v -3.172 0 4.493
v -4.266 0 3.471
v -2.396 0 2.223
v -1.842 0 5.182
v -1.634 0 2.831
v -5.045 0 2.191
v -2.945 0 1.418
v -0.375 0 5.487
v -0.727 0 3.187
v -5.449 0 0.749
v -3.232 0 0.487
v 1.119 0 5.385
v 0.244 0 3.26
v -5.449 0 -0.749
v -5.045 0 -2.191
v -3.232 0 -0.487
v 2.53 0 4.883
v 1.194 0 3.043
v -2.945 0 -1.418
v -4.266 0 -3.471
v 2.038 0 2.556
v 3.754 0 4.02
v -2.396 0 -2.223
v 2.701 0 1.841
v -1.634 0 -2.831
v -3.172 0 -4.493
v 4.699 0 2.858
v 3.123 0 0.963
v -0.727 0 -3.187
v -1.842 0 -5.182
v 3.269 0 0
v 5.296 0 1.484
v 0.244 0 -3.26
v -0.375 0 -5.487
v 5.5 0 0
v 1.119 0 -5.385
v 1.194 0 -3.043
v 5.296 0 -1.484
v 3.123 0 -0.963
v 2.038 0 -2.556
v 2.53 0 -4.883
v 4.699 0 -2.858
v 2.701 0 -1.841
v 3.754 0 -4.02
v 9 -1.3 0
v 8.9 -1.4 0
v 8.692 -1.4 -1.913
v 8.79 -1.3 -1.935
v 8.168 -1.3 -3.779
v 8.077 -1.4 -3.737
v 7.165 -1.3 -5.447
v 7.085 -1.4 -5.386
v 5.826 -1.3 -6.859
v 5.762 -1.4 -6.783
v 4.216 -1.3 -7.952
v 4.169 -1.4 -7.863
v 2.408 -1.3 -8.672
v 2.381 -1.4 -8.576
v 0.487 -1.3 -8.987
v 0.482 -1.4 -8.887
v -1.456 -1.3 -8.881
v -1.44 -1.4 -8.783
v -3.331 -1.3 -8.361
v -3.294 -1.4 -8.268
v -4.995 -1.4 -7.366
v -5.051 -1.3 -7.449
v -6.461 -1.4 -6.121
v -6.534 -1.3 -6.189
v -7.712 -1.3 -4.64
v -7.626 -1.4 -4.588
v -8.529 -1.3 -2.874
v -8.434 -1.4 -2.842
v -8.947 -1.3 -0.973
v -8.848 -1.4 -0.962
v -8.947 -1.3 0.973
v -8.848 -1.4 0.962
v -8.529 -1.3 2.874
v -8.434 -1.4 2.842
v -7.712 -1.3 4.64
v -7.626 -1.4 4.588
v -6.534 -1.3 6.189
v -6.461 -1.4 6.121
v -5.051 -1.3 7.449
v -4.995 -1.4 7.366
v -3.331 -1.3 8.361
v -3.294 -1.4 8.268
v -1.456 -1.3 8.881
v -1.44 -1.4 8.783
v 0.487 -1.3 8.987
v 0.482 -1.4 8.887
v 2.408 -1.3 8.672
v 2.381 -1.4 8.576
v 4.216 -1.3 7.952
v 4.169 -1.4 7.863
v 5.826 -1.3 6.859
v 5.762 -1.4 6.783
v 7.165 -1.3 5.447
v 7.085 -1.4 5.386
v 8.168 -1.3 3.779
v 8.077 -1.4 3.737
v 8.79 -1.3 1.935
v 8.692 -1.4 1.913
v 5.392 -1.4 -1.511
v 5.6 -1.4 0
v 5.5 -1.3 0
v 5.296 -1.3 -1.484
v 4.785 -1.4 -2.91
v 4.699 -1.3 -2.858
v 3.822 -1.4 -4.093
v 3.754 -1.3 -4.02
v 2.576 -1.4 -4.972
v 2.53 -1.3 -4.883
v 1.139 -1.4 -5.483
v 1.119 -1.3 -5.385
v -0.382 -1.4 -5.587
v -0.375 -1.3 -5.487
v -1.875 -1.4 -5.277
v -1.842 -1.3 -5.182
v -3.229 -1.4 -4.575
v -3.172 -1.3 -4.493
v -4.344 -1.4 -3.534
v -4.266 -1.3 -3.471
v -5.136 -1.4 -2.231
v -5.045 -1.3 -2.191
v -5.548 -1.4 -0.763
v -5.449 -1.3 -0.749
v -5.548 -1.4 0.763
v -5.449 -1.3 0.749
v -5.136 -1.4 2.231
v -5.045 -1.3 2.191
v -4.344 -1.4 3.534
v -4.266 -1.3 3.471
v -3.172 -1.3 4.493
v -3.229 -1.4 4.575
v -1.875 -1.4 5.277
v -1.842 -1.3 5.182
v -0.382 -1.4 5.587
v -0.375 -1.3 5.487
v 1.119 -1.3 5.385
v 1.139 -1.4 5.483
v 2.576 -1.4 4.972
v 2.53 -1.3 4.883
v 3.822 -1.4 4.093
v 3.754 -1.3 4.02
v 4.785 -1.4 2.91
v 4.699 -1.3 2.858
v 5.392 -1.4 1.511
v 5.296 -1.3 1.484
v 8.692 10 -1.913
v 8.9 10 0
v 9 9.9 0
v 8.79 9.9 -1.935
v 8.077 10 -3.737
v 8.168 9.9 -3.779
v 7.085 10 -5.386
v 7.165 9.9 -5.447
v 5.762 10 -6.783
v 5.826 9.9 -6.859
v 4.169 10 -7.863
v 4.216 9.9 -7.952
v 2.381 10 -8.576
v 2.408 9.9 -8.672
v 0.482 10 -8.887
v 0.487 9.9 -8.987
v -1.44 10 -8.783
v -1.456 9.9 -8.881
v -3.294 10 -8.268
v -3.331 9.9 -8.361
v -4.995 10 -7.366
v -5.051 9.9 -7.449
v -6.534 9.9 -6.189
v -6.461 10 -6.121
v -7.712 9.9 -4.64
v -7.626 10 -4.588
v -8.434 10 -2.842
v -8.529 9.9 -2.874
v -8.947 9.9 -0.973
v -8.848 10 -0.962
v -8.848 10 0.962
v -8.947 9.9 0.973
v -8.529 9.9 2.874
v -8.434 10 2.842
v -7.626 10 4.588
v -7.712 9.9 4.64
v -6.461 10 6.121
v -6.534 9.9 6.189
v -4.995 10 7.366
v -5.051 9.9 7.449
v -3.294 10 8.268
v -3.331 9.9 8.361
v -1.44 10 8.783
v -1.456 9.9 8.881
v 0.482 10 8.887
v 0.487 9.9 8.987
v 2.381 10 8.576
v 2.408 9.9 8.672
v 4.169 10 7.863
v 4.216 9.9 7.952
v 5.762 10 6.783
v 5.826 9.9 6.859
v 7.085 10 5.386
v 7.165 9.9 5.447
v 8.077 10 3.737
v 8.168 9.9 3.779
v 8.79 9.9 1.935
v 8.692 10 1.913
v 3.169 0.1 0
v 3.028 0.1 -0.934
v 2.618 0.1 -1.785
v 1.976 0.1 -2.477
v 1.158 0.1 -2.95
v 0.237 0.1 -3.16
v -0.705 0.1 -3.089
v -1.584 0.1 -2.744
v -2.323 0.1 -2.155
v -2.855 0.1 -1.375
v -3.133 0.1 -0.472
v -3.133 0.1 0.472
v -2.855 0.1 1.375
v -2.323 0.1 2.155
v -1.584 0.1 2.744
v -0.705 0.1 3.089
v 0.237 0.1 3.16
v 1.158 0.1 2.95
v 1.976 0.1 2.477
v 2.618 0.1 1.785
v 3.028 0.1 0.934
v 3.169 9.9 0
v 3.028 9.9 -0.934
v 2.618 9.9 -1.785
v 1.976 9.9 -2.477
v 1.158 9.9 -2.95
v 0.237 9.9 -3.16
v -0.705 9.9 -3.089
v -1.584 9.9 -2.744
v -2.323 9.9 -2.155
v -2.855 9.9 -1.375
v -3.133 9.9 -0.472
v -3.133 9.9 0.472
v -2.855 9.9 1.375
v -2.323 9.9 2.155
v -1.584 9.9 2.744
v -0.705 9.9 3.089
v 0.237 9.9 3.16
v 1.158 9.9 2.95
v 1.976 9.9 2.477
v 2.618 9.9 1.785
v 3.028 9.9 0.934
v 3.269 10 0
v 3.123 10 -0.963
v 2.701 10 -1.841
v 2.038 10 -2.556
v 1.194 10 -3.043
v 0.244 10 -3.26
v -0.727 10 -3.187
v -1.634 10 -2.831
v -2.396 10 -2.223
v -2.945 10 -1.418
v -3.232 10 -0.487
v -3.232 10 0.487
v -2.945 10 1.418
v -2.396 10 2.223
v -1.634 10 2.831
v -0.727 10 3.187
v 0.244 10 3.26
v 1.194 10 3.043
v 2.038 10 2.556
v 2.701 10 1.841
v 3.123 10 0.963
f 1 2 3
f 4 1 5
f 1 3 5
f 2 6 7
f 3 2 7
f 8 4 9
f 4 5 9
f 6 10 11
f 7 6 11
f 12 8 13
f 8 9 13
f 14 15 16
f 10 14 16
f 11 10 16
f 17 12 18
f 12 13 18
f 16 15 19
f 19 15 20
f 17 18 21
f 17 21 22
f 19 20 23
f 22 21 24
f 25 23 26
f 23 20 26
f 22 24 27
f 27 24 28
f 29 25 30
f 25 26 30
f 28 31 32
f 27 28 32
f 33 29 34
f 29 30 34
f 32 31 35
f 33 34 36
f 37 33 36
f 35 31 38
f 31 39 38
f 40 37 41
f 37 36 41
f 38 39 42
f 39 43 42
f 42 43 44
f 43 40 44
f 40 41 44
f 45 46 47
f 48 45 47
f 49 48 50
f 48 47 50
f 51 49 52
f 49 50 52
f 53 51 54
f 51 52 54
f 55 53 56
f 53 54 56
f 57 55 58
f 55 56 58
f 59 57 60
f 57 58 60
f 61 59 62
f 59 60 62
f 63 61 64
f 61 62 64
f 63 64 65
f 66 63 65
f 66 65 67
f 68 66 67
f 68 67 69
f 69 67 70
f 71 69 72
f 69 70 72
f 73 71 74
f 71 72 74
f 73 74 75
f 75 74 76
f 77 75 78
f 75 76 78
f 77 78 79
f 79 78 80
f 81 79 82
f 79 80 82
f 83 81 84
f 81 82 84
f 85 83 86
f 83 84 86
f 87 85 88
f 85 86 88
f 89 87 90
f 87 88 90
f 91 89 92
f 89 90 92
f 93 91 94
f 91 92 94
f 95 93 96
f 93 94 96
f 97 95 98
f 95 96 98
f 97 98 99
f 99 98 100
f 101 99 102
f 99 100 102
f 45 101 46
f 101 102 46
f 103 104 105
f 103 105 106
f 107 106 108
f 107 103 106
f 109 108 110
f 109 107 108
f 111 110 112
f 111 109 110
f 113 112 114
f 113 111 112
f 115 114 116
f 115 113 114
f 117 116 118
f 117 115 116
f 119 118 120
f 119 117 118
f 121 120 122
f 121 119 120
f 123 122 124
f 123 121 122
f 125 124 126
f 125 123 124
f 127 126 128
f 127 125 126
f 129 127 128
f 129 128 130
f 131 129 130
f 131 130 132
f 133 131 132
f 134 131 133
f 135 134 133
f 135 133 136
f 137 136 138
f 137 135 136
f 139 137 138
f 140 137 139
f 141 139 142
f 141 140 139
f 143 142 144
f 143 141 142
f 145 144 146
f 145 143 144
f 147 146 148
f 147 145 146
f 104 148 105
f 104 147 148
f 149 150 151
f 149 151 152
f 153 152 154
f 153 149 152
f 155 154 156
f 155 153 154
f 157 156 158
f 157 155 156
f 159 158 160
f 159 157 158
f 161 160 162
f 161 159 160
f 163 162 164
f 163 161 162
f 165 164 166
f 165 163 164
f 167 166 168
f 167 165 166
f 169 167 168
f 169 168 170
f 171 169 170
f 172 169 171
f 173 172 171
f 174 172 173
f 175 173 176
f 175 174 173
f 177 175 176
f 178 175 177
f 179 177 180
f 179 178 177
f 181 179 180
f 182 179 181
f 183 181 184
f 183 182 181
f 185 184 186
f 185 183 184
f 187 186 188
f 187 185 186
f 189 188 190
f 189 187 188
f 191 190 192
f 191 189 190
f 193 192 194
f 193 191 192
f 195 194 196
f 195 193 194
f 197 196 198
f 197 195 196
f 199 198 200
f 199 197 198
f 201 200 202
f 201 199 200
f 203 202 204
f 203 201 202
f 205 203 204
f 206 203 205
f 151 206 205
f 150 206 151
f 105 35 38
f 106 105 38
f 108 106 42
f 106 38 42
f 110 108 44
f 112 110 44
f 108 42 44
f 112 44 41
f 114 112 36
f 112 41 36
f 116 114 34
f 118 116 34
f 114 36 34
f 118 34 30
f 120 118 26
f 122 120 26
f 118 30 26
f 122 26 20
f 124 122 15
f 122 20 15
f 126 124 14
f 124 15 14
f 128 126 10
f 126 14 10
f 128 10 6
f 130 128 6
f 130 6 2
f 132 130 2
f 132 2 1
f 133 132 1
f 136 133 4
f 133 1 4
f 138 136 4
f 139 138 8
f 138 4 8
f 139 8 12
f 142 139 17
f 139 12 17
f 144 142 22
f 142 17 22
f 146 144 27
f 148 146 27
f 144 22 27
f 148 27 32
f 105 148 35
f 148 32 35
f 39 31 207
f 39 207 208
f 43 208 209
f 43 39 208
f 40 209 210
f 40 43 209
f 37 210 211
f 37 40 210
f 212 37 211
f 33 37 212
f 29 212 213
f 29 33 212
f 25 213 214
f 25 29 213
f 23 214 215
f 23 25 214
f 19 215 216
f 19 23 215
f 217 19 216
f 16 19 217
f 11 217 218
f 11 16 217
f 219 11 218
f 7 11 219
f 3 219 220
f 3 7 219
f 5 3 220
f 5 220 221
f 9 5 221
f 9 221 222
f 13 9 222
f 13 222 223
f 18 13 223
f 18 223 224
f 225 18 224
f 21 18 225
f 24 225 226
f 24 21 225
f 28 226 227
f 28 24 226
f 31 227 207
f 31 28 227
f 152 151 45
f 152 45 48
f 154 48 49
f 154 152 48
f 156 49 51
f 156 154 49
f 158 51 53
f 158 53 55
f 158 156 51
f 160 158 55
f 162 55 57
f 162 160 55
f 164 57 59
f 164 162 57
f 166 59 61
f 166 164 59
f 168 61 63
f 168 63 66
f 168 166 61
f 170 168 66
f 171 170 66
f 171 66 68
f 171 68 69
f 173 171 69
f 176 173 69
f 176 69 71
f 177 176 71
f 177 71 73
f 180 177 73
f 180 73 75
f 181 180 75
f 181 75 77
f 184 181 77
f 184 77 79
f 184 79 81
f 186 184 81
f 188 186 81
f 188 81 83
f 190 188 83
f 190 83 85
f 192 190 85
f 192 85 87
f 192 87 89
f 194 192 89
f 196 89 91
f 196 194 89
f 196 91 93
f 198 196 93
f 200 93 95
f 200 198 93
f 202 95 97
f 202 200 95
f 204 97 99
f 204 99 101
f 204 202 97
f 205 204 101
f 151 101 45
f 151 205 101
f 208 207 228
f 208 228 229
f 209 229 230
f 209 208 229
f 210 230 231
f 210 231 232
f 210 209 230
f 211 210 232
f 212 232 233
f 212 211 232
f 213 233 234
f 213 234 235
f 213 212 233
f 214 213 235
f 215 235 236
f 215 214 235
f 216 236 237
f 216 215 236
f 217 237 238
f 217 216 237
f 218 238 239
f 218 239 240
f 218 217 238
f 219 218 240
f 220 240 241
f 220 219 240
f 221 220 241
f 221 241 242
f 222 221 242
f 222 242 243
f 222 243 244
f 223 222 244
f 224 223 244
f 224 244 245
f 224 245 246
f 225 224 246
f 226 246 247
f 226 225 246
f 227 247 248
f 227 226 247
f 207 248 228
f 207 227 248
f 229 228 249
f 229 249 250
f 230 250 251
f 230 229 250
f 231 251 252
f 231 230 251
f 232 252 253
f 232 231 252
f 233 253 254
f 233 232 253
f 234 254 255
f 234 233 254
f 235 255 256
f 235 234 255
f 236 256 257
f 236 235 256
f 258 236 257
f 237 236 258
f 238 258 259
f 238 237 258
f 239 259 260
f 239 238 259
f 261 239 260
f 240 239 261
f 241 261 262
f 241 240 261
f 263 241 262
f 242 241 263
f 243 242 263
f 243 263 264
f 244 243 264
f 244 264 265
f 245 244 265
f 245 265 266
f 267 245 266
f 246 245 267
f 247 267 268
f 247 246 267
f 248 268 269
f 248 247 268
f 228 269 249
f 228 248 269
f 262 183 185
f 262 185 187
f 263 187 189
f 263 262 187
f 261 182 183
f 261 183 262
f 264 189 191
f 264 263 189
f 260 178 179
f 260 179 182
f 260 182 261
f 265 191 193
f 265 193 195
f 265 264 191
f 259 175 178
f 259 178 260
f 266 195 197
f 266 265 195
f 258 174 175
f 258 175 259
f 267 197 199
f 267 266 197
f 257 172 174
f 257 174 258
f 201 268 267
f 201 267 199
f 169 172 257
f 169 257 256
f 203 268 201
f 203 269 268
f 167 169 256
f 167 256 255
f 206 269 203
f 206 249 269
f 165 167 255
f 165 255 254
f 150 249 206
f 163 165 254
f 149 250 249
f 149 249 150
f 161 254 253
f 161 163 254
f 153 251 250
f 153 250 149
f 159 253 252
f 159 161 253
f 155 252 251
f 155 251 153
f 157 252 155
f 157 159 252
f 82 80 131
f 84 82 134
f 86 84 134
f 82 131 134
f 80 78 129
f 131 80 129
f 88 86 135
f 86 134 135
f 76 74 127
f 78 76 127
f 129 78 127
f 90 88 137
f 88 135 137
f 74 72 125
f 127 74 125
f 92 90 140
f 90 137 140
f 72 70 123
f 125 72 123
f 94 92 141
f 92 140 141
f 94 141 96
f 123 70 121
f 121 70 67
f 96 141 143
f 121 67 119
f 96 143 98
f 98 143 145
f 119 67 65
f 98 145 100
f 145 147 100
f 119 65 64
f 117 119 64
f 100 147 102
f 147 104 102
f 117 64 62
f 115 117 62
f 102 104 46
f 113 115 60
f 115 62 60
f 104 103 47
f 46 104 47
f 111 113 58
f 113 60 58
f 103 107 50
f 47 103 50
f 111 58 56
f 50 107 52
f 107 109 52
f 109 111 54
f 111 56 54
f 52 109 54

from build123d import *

# Parameters (mm, degrees)
MAIN_DIMENSIONS_SKETCH_R   = 9
MAIN_DIMENSIONS_SKETCH_R_2 = 3.16865
BODY_DEPTH                 = 10
LIP_START                  = -1.4
SKETCH1_3_R                = 9
SKETCH1_3_R_2              = 5.5
LIP_DEPTH                  = 1.4
BREAK_EDGES_SIZE           = 0.1


with BuildPart() as part:
    # main_dimensions_sketch → body (new body)
    with BuildSketch(Plane(origin=(0, 0, 0), x_dir=(1, 0, 0), z_dir=(0, 1, 0))):
        Circle(MAIN_DIMENSIONS_SKETCH_R)
        Circle(MAIN_DIMENSIONS_SKETCH_R_2, mode=Mode.SUBTRACT)
    extrude(amount=BODY_DEPTH)

    # Sketch1<3> → lip (add)
    with BuildSketch(Plane(origin=(0, 0, 0), x_dir=(1, 0, 0), z_dir=(0, 1, 0)).offset(LIP_START)):
        Circle(SKETCH1_3_R)
        Circle(SKETCH1_3_R_2, mode=Mode.SUBTRACT)
    extrude(amount=LIP_DEPTH)

    # break_edges
    break_edges_edges = [part.edges().sort_by_distance(p)[0] for p in [
        (-9, -1.4, 0),
        (-5.5, -1.4, 0),
        (-3.16865, 10, 0),
        (-9, 10, 0),
        (-3.16865, 0, 0),
    ]]
    chamfer(break_edges_edges, length=BREAK_EDGES_SIZE)


solid = part.part
